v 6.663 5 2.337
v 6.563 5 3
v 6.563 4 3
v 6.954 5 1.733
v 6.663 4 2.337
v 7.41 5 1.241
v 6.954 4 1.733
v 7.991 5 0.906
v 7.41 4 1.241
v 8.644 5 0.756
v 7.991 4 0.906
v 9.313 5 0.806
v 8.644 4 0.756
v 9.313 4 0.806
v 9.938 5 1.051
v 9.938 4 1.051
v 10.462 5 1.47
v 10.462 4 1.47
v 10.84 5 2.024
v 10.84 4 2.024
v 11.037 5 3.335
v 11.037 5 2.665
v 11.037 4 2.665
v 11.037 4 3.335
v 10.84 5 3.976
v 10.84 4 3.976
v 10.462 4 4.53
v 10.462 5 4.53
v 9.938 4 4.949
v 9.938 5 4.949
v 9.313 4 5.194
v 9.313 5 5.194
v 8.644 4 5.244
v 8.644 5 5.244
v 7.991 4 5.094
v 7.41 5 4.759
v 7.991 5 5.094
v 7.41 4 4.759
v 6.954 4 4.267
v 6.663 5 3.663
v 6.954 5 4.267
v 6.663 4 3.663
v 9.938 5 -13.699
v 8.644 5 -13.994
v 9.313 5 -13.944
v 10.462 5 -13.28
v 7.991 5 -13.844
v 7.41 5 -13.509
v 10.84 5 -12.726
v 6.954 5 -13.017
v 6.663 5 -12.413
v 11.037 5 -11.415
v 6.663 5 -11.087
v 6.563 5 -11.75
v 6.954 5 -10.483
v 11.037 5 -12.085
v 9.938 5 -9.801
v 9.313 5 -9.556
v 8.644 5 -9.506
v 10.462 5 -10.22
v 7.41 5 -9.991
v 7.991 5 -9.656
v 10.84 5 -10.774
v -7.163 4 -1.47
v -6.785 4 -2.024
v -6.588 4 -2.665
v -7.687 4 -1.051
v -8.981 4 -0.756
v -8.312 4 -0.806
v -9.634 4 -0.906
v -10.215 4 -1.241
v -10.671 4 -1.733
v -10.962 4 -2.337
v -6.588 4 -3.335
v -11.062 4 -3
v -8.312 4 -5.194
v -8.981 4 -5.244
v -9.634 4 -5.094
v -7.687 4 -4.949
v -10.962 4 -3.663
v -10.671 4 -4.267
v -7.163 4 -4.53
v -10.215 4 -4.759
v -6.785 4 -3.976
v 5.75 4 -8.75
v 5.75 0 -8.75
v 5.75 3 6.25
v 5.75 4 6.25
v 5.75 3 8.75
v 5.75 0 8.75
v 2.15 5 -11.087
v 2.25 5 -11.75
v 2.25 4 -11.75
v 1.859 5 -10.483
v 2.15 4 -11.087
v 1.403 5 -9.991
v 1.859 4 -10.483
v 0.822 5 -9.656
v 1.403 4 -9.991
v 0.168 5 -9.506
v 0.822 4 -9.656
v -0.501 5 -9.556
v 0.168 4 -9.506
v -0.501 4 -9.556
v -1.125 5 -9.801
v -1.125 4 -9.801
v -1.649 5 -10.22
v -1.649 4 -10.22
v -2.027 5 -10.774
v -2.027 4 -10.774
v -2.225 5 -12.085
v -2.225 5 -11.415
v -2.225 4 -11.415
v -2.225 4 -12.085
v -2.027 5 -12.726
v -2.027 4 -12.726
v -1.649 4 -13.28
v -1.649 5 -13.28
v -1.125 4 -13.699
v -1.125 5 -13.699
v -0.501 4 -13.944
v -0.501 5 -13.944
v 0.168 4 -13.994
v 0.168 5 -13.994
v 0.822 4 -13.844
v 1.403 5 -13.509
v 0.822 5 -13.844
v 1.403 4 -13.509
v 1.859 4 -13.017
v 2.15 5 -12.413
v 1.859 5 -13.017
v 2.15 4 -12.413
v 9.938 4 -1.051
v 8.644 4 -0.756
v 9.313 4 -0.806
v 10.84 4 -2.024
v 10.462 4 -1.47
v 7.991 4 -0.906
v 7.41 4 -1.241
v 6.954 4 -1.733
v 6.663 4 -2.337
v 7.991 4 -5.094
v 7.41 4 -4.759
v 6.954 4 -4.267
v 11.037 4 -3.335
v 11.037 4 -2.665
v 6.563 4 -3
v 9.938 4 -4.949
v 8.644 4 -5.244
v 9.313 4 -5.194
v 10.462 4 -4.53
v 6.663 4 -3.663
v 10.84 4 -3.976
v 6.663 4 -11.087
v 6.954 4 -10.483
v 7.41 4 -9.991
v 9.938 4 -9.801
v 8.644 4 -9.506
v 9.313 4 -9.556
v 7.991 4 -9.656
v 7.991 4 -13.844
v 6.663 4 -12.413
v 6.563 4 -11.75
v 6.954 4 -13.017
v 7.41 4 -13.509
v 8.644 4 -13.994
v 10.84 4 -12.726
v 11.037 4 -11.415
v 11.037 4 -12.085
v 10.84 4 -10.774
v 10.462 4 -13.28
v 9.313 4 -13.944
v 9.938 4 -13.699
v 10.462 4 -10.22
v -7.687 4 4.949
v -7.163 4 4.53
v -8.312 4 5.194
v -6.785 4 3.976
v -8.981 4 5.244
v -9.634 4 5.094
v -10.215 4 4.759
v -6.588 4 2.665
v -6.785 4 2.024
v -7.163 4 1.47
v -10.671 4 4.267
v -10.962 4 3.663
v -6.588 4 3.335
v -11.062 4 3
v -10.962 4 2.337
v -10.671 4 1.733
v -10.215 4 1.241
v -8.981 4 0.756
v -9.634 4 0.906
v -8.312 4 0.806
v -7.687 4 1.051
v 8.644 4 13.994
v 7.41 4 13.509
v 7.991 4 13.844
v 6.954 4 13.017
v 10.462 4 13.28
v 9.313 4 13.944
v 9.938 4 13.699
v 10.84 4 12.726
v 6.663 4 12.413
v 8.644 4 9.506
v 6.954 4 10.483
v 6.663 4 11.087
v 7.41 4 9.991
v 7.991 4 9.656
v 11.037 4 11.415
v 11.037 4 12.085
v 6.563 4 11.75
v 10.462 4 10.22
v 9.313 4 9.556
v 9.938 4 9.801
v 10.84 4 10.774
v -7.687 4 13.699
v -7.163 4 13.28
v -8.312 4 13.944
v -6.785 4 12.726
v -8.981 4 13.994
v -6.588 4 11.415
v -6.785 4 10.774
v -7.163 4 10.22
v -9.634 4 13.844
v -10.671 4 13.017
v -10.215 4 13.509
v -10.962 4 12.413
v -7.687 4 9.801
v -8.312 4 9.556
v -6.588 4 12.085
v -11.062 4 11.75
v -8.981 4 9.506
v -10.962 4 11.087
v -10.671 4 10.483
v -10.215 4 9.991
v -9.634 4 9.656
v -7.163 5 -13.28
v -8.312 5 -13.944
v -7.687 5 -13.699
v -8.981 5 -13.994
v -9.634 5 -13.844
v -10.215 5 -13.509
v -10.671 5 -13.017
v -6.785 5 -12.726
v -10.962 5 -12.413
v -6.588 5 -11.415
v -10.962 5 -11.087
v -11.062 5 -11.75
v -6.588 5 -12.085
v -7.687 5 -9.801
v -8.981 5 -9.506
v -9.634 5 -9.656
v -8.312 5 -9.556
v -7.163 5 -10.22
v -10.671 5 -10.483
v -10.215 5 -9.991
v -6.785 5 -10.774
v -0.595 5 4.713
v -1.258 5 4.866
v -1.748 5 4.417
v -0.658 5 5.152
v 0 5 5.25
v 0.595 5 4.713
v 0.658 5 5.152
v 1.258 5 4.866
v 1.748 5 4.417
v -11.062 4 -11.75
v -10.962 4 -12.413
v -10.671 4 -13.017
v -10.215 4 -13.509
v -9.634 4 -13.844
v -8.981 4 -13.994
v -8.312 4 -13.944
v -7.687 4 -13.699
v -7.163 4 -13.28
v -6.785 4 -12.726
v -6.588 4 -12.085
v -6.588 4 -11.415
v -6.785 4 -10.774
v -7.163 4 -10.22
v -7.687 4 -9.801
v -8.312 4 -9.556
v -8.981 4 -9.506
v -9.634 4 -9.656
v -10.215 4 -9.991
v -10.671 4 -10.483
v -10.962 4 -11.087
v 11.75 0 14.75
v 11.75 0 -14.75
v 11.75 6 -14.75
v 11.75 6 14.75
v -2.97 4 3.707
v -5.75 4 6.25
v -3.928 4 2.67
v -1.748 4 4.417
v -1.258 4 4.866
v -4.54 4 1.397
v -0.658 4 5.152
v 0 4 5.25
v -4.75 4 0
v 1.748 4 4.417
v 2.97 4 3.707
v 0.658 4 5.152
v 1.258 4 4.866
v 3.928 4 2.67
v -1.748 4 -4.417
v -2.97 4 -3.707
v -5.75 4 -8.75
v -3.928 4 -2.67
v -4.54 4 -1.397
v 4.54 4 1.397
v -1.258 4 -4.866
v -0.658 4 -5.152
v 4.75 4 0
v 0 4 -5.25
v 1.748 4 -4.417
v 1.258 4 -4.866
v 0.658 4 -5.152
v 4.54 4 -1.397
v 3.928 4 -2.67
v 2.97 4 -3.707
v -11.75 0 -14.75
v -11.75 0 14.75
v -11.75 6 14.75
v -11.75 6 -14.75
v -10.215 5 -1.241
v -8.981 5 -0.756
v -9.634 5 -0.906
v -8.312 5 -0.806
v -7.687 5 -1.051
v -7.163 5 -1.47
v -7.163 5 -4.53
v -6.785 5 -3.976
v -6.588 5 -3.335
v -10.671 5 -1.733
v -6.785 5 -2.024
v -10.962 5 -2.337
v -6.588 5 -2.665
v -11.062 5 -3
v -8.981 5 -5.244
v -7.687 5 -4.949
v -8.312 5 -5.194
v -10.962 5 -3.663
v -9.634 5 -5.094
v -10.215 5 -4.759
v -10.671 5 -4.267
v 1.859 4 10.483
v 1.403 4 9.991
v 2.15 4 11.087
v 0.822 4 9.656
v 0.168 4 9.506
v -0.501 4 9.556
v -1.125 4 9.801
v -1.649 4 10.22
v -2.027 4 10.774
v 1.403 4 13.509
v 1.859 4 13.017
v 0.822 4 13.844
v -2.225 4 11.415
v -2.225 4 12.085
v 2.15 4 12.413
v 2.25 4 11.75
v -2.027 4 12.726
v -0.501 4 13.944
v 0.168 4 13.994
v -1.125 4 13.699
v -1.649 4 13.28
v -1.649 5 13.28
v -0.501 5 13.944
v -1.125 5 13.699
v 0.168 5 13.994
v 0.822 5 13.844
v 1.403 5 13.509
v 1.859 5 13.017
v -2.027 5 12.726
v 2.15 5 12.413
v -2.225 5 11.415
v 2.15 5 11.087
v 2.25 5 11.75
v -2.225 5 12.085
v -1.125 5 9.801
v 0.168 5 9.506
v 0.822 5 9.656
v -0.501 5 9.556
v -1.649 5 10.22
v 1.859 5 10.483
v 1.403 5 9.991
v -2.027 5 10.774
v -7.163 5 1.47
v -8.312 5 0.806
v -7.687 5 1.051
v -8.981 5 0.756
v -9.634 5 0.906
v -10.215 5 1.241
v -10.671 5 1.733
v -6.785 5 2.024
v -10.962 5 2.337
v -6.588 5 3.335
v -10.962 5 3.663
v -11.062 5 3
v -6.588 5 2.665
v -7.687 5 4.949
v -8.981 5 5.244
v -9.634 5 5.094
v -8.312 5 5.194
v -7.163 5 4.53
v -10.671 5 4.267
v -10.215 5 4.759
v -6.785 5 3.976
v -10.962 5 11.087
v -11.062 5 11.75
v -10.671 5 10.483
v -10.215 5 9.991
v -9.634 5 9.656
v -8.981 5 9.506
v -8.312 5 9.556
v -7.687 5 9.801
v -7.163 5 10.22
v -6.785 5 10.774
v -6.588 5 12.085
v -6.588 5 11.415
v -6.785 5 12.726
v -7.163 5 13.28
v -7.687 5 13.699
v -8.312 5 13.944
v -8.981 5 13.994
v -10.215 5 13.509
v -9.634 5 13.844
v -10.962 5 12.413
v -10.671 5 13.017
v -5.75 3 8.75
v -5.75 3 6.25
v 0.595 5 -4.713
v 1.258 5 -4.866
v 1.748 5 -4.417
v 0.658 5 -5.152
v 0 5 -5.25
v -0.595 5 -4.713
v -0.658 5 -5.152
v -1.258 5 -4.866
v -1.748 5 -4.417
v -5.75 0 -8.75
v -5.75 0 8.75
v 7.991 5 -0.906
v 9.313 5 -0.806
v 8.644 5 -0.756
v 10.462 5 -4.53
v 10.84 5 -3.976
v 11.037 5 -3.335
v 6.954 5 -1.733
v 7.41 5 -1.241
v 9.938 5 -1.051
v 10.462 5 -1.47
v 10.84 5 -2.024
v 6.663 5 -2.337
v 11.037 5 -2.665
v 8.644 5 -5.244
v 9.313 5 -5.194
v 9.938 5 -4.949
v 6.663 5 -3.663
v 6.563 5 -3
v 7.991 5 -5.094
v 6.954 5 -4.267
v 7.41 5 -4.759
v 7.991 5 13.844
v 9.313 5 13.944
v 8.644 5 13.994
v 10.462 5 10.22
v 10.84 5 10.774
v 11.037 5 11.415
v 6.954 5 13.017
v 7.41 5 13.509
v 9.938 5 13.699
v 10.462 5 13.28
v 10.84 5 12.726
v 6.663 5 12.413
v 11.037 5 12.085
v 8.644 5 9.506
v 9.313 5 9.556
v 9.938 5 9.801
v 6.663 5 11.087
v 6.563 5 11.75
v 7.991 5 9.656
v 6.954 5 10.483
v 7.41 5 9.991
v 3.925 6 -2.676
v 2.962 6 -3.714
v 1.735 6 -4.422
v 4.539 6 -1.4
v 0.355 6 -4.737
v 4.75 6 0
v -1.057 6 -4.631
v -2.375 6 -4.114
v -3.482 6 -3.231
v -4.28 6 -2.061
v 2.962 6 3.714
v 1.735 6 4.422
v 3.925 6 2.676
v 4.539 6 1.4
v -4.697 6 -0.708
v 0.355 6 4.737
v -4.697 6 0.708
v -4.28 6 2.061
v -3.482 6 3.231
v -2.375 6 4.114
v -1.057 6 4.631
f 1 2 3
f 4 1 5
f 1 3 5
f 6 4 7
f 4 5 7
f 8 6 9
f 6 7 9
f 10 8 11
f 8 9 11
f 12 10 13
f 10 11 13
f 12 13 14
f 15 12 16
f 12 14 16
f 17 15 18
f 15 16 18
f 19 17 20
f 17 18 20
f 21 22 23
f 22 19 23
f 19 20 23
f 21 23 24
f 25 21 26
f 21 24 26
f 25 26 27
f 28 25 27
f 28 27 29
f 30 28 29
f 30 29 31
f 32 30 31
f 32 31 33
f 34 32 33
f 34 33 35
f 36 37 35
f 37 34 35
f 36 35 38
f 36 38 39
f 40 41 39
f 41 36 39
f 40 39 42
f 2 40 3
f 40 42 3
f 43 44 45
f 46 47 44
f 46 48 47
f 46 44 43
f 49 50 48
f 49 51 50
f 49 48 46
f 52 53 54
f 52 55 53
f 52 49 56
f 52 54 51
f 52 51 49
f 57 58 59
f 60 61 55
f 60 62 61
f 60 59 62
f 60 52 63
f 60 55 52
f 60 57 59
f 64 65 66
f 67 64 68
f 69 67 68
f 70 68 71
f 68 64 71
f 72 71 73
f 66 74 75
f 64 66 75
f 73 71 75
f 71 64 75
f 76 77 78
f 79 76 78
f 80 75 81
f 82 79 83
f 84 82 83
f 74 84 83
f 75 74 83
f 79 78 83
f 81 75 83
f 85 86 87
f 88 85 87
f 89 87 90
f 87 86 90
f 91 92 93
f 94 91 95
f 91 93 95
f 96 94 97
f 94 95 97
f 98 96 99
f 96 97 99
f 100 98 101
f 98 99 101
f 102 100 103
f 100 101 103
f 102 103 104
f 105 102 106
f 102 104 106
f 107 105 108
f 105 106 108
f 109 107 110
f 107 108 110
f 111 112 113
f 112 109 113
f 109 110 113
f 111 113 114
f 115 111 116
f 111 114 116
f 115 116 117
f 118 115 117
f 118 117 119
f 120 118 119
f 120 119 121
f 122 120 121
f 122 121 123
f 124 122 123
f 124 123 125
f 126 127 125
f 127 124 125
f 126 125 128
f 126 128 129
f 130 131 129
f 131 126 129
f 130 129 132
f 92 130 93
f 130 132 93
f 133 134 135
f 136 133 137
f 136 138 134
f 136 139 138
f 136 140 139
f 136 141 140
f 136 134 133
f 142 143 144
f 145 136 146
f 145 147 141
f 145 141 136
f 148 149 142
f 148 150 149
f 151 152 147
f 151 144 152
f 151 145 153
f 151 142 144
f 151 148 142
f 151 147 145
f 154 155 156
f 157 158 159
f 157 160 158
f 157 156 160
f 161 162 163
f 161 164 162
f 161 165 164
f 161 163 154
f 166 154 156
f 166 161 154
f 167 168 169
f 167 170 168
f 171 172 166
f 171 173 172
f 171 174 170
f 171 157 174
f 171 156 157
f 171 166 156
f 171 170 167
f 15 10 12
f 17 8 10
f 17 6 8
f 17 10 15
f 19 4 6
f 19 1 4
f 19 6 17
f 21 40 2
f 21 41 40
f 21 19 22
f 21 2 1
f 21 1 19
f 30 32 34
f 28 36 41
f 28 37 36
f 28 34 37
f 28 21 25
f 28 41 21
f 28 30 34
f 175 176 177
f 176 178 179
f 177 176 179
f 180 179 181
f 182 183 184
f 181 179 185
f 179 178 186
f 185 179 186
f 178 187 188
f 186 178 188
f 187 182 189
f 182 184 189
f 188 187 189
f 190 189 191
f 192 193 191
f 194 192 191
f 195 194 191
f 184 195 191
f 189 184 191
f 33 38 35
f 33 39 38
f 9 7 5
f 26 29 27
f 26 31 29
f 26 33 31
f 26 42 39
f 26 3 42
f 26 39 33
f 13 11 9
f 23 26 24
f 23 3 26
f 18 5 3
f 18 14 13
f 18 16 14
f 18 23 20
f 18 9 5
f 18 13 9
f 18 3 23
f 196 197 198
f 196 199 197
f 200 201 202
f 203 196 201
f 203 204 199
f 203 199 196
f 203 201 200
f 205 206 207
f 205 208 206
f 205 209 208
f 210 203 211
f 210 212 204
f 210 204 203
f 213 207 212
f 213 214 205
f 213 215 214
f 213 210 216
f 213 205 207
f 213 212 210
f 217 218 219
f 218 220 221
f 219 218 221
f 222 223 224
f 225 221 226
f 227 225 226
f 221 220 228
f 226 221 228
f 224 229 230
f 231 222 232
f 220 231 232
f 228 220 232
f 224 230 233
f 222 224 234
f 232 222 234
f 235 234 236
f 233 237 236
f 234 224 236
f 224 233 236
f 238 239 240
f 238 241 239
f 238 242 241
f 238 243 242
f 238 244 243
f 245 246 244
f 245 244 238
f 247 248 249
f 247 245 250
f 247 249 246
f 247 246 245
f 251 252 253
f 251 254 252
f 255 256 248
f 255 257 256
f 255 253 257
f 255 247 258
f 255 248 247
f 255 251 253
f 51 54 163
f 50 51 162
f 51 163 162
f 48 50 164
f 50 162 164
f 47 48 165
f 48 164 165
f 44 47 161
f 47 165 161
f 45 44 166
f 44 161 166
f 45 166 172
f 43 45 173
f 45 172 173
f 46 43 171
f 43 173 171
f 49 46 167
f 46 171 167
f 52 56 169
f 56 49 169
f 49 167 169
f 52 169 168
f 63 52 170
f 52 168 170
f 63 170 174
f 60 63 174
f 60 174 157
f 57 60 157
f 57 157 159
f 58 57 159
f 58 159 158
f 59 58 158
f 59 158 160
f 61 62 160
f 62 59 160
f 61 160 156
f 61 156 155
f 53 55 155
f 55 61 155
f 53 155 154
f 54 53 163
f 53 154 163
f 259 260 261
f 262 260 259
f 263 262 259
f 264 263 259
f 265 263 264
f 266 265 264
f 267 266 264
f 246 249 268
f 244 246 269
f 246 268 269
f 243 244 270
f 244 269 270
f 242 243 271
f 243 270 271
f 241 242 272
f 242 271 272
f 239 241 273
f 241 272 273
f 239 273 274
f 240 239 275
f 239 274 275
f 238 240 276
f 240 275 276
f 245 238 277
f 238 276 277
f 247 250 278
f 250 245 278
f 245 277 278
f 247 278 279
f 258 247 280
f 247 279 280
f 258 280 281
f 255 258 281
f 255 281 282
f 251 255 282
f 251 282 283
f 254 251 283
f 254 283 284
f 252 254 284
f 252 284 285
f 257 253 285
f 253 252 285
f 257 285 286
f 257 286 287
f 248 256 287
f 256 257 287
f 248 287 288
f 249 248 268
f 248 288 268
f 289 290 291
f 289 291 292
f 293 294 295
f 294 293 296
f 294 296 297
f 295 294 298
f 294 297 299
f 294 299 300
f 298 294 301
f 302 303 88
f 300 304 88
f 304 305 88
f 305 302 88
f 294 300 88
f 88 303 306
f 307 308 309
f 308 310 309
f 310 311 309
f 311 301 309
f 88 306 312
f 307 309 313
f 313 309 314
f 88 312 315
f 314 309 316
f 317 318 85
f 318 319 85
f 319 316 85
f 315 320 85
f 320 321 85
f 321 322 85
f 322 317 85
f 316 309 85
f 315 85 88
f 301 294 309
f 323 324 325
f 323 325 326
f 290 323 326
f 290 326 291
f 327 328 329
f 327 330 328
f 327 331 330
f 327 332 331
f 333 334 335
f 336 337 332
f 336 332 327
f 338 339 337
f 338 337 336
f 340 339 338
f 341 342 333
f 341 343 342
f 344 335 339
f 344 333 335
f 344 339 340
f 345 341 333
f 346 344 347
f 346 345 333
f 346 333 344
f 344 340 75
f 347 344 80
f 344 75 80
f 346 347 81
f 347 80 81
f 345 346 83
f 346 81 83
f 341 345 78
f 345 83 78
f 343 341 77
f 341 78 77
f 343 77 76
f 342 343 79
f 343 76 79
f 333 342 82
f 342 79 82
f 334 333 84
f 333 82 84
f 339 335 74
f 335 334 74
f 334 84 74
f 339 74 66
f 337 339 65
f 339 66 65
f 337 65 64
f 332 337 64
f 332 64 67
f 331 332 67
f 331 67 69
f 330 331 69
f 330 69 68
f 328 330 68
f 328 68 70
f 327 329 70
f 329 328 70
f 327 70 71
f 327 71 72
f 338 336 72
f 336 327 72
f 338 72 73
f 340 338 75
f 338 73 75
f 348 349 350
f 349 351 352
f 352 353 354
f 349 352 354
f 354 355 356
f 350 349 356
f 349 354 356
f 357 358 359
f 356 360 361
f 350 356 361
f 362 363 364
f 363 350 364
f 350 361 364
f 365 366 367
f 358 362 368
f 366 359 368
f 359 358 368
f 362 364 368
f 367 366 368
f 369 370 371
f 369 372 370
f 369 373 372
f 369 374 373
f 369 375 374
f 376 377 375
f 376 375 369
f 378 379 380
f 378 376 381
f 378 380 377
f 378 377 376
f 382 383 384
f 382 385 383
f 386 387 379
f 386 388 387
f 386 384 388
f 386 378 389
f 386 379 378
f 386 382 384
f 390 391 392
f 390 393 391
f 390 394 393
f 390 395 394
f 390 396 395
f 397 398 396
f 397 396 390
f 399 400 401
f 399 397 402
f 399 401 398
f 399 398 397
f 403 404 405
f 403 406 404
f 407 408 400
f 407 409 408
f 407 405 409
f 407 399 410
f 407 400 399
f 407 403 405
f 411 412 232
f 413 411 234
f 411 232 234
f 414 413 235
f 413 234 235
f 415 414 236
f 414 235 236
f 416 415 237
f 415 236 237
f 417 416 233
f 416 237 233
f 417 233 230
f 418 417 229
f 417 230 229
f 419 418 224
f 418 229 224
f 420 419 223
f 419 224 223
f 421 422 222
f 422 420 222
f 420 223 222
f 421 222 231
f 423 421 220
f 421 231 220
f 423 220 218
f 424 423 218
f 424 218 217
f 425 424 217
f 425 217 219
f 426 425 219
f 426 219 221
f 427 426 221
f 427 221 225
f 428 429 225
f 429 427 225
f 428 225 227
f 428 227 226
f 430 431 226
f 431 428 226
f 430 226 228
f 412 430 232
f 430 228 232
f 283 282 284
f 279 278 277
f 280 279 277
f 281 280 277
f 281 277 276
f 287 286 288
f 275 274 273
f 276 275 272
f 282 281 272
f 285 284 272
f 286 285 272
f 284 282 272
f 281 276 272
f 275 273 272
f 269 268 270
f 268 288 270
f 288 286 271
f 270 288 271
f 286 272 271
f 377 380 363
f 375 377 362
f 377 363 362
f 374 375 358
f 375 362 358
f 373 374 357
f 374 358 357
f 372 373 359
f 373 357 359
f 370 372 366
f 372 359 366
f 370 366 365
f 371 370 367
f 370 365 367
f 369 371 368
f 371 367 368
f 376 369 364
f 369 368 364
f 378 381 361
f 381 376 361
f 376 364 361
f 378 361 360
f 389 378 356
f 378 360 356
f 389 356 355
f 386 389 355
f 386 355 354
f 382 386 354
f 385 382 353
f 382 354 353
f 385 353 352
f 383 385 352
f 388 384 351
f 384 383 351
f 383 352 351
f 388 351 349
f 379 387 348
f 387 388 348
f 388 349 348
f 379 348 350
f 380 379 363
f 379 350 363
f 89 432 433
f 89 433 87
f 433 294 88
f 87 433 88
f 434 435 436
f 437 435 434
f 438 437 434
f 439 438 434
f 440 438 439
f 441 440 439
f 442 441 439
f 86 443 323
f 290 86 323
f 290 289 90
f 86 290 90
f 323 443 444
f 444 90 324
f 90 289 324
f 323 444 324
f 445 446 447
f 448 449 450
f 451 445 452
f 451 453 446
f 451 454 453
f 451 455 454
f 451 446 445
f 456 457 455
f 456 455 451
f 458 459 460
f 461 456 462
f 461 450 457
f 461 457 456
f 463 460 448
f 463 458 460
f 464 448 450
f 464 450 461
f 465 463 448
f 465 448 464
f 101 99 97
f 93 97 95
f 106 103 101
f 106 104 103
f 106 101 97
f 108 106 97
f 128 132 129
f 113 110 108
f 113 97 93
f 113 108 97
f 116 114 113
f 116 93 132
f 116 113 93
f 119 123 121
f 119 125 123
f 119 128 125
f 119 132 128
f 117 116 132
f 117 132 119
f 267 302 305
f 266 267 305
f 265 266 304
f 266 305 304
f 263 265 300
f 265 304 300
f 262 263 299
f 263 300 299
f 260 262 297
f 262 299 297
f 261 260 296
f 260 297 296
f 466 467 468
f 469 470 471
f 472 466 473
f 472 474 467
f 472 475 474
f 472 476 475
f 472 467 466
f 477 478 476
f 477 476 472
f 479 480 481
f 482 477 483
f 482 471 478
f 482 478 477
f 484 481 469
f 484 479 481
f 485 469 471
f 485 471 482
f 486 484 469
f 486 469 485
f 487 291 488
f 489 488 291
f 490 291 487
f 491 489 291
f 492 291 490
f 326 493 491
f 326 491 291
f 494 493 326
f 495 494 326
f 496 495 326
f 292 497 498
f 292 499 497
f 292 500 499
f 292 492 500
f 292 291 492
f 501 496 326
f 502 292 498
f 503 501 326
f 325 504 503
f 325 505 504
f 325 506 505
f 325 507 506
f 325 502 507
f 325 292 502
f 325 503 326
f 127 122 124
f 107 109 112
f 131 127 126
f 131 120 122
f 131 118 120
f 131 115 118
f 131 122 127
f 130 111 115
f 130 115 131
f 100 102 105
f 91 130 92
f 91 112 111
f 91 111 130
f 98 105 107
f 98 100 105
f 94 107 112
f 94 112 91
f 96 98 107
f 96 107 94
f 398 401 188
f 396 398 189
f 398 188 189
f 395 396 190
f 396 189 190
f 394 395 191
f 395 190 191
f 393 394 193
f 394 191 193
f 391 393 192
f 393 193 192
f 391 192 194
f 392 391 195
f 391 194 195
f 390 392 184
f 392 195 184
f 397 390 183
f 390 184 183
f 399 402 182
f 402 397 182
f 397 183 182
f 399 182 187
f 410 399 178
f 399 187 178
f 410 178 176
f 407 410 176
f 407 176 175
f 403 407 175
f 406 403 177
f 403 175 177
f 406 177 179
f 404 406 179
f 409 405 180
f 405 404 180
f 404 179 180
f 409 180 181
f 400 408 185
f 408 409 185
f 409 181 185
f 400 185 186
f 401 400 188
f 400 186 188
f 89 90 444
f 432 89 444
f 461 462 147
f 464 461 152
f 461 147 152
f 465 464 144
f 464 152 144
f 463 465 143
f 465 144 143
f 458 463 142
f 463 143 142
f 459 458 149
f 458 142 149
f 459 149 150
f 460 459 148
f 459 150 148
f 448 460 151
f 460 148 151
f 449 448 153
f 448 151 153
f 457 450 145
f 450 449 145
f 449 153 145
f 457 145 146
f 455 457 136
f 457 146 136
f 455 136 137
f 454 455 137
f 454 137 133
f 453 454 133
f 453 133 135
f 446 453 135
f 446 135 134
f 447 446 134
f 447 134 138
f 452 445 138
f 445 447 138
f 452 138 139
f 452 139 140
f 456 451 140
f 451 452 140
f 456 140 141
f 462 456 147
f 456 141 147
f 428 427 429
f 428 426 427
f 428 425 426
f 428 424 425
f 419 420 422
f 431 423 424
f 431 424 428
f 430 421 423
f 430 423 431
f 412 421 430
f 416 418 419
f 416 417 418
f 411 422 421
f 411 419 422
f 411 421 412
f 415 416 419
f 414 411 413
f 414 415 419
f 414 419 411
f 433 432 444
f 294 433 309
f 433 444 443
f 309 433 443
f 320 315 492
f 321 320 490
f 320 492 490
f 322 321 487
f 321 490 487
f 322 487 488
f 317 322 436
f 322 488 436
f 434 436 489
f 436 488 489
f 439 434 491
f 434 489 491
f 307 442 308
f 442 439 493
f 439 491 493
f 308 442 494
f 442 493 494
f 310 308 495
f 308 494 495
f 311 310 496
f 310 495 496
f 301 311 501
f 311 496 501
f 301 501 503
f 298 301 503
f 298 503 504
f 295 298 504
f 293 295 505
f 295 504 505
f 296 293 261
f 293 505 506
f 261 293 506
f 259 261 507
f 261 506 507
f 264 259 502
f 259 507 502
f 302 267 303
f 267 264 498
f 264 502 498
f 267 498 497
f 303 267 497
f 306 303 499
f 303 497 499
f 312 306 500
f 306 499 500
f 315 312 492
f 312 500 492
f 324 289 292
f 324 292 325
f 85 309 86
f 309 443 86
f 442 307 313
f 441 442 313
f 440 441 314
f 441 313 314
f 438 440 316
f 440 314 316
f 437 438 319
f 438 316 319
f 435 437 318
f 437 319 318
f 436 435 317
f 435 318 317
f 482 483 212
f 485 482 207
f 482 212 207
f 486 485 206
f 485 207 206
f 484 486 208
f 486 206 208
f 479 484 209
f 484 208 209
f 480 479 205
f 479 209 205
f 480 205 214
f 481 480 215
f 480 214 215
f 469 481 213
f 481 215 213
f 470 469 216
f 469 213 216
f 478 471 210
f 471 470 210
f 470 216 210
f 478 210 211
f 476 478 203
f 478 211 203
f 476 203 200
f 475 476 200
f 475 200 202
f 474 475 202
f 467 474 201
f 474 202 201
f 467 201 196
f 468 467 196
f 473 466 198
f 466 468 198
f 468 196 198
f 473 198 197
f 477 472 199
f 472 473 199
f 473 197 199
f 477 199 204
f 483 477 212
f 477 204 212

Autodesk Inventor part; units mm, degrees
sketch "Sketch1" plane through (0, 0, 0) normal (0, 1, 0) x (-1, 0, 0)
  line L0 (-11.75, 14.75) -> (11.75, 14.75)
  line L1 (11.75, 14.75) -> (11.75, -14.75)
  line L2 (11.75, -14.75) -> (-11.75, -14.75)
  line L3 (-11.75, -14.75) -> (-11.75, 14.75)
  line L4 (-11.75, 14.75) -> (11.75, -14.75) construction
  line L5 (11.75, 14.75) -> (-11.75, -14.75) construction
  line L6 (-5.75, 8.75) -> (5.75, 8.75)
  line L7 (5.75, 8.75) -> (5.75, -8.75)
  line L8 (5.75, -8.75) -> (-5.75, -8.75)
  line L9 (-5.75, -8.75) -> (-5.75, 8.75)
  line L10 (-5.75, 8.75) -> (5.75, -8.75) construction
  line L11 (5.75, 8.75) -> (-5.75, -8.75) construction
  point P0 (0, 0)
  dimension "d0" = 23.5
  dimension "d1" = 29.5
  dimension "d2" = 11.5
  dimension "d3" = 17.5
extrude "Extrusion1" add sketch "Sketch1" along normal blind 6
sketch "Sketch2" plane through (0, 6, 0) normal (0, 1, 0) x (1, 0, 0)
  circle A0 centre (0, 0) radius 4.75
  line L0 (5.75, -8.75) -> (-5.75, -8.75) projected
  line L1 (-5.75, -8.75) -> (5.75, -8.75)
  line L2 (5.75, -8.75) -> (5.75, 8.75)
  line L3 (5.75, 8.75) -> (-5.75, 8.75)
  line L4 (-5.75, 8.75) -> (-5.75, -8.75)
  dimension "d6" = 9.5
extrude "Extrusion2" add sketch "Sketch2" against normal blind 2
sketch "Sketch4" plane through (0, 4, 0) normal (0, -1, 0) x (1, 0, 0)
  line L0 (-5.75, 8.75) -> (5.75, 8.75) projected
  line L1 (-5.75, -8.75) -> (-5.75, 8.75) projected
  line L2 (5.75, 8.75) -> (-5.75, 8.75)
  line L3 (-5.75, 8.75) -> (-5.75, 6.25)
  line L4 (-5.75, 6.25) -> (5.75, 6.25)
  line L5 (5.75, 6.25) -> (5.75, 8.75)
  point P0 (0, 0)
  dimension "d9" = 2.5
sketch "Sketch5" plane through (0, 0, 0) normal (0, -1, 0) x (1, 0, 0)
  line L0 (-5.75, -8.75) -> (5.75, -8.75) projected
  line L1 (0, -8.75) -> (0, -11.75)
  line L2 (11.75, -14.75) -> (-11.75, -14.75) projected
  circle A0 centre (0, -11.75) radius 2.25
  point P0 (0, 0)
  dimension "d10" = 3
  dimension "d11" = 4.5
extrude "Extrusion3" cut sketch "Sketch5" against normal blind 5
ref_plane "Work Plane1" through (0, 0, 14.75) normal (1, 0, 0) x (0, 0, -1)
ref_plane "Work Plane2" through (11.75, 0, 0) normal (0, 0, -1) x (-1, 0, 0)
ref_plane "Work Plane3" through (-5.875, 0, -14.75) normal (-1, 0, 0) x (0, 0, 1)
ref_plane "Work Plane4" through (5.875, 0, 14.75) normal (1, 0, 0) x (0, 0, -1)
ref_plane "Work Plane6" through (4.4063, 0, 14.75) normal (1, 0, 0) x (0, 0, -1)
ref_plane "Work Plane5" through (-2.9375, 0, -14.75) normal (-1, 0, 0) x (0, 0, 1)
ref_plane "Work Plane8" through (-4.4062, 0, -14.75) normal (-1, 0, 0) x (0, 0, 1)
ref_plane "Work Plane7" through (2.9375, 0, 14.75) normal (1, 0, 0) x (0, 0, -1)
mirror "Mirror2" about plane through (11.75, 0, 0) normal (0, 0, -1) of "Extrusion3"
mirror "Mirror3" about plane through (4.4063, 0, 14.75) normal (1, 0, 0) of "Extrusion3", "Mirror2"
mirror "Mirror4" about plane through (-4.4062, 0, -14.75) normal (-1, 0, 0) of "Extrusion3", "Mirror2"
ref_plane "Work Plane9" through (11.75, 0, -7.375) normal (0, 0, -1) x (-1, 0, 0)
ref_plane "Work Plane10" through (-11.75, 0, 7.375) normal (0, 0, 1) x (1, 0, 0)
mirror "Mirror5" about plane through (-11.75, 0, 7.375) normal (0, 0, 1) of "Extrusion3", "Mirror2", "Mirror4", "Mirror3"
mirror "Mirror6" about plane through (11.75, 0, -7.375) normal (0, 0, -1) of "Extrusion3", "Mirror2", "Mirror4", "Mirror3"
extrude "Extrusion4" add sketch "Sketch4" along normal blind 1
sketch "Sketch7" plane through (11.75, 0, -14.75) normal (0, 0, -1) x (-1, 0, 0)
  line L0 (23.5, 0) -> (23.5, 6) projected
  line L1 (23.5, 0) -> (17.5, 0)
  line L2 (17.5, 0) -> (17.5, 4)
  line L3 (17.5, 4) -> (23.5, 4)
  line L4 (23.5, 4) -> (23.5, 0)
  line L5 (0, 0) -> (0, 6) projected
  line L6 (0, 0) -> (6, 0)
  line L7 (6, 0) -> (6, 4)
  line L8 (6, 4) -> (0, 4)
  line L9 (0, 4) -> (0, 0)
  point P0 (11.75, 0)
  dimension "d16" = 6
  dimension "d17" = 4
  dimension "d18" = 6
  dimension "d19" = 4
extrude "Extrusion5" add sketch "Sketch7" against normal blind 29.5
sketch "Sketch8" plane through (-11.75, 0, -14.75) normal (-1, 0, 0) x (0, 0, 1)
  line L0 (29.5, 0) -> (29.5, 6) projected
  line L1 (29.5, 0) -> (23.5, 0)
  line L2 (23.5, 0) -> (23.5, 4)
  line L3 (23.5, 4) -> (29.5, 4)
  line L4 (29.5, 4) -> (29.5, 0)
  line L5 (0, 0) -> (0, 6) projected
  line L6 (0, 0) -> (6, 0)
  line L7 (6, 0) -> (6, 4)
  line L8 (6, 4) -> (0, 4)
  line L9 (0, 4) -> (0, 0)
  point P0 (14.75, 0)
  dimension "d22" = 6
  dimension "d23" = 4
  dimension "d24" = 6
  dimension "d25" = 4
extrude "Extrusion6" add sketch "Sketch8" against normal blind 23.5
properties part number "sensor bulet + magnet tes 1"
